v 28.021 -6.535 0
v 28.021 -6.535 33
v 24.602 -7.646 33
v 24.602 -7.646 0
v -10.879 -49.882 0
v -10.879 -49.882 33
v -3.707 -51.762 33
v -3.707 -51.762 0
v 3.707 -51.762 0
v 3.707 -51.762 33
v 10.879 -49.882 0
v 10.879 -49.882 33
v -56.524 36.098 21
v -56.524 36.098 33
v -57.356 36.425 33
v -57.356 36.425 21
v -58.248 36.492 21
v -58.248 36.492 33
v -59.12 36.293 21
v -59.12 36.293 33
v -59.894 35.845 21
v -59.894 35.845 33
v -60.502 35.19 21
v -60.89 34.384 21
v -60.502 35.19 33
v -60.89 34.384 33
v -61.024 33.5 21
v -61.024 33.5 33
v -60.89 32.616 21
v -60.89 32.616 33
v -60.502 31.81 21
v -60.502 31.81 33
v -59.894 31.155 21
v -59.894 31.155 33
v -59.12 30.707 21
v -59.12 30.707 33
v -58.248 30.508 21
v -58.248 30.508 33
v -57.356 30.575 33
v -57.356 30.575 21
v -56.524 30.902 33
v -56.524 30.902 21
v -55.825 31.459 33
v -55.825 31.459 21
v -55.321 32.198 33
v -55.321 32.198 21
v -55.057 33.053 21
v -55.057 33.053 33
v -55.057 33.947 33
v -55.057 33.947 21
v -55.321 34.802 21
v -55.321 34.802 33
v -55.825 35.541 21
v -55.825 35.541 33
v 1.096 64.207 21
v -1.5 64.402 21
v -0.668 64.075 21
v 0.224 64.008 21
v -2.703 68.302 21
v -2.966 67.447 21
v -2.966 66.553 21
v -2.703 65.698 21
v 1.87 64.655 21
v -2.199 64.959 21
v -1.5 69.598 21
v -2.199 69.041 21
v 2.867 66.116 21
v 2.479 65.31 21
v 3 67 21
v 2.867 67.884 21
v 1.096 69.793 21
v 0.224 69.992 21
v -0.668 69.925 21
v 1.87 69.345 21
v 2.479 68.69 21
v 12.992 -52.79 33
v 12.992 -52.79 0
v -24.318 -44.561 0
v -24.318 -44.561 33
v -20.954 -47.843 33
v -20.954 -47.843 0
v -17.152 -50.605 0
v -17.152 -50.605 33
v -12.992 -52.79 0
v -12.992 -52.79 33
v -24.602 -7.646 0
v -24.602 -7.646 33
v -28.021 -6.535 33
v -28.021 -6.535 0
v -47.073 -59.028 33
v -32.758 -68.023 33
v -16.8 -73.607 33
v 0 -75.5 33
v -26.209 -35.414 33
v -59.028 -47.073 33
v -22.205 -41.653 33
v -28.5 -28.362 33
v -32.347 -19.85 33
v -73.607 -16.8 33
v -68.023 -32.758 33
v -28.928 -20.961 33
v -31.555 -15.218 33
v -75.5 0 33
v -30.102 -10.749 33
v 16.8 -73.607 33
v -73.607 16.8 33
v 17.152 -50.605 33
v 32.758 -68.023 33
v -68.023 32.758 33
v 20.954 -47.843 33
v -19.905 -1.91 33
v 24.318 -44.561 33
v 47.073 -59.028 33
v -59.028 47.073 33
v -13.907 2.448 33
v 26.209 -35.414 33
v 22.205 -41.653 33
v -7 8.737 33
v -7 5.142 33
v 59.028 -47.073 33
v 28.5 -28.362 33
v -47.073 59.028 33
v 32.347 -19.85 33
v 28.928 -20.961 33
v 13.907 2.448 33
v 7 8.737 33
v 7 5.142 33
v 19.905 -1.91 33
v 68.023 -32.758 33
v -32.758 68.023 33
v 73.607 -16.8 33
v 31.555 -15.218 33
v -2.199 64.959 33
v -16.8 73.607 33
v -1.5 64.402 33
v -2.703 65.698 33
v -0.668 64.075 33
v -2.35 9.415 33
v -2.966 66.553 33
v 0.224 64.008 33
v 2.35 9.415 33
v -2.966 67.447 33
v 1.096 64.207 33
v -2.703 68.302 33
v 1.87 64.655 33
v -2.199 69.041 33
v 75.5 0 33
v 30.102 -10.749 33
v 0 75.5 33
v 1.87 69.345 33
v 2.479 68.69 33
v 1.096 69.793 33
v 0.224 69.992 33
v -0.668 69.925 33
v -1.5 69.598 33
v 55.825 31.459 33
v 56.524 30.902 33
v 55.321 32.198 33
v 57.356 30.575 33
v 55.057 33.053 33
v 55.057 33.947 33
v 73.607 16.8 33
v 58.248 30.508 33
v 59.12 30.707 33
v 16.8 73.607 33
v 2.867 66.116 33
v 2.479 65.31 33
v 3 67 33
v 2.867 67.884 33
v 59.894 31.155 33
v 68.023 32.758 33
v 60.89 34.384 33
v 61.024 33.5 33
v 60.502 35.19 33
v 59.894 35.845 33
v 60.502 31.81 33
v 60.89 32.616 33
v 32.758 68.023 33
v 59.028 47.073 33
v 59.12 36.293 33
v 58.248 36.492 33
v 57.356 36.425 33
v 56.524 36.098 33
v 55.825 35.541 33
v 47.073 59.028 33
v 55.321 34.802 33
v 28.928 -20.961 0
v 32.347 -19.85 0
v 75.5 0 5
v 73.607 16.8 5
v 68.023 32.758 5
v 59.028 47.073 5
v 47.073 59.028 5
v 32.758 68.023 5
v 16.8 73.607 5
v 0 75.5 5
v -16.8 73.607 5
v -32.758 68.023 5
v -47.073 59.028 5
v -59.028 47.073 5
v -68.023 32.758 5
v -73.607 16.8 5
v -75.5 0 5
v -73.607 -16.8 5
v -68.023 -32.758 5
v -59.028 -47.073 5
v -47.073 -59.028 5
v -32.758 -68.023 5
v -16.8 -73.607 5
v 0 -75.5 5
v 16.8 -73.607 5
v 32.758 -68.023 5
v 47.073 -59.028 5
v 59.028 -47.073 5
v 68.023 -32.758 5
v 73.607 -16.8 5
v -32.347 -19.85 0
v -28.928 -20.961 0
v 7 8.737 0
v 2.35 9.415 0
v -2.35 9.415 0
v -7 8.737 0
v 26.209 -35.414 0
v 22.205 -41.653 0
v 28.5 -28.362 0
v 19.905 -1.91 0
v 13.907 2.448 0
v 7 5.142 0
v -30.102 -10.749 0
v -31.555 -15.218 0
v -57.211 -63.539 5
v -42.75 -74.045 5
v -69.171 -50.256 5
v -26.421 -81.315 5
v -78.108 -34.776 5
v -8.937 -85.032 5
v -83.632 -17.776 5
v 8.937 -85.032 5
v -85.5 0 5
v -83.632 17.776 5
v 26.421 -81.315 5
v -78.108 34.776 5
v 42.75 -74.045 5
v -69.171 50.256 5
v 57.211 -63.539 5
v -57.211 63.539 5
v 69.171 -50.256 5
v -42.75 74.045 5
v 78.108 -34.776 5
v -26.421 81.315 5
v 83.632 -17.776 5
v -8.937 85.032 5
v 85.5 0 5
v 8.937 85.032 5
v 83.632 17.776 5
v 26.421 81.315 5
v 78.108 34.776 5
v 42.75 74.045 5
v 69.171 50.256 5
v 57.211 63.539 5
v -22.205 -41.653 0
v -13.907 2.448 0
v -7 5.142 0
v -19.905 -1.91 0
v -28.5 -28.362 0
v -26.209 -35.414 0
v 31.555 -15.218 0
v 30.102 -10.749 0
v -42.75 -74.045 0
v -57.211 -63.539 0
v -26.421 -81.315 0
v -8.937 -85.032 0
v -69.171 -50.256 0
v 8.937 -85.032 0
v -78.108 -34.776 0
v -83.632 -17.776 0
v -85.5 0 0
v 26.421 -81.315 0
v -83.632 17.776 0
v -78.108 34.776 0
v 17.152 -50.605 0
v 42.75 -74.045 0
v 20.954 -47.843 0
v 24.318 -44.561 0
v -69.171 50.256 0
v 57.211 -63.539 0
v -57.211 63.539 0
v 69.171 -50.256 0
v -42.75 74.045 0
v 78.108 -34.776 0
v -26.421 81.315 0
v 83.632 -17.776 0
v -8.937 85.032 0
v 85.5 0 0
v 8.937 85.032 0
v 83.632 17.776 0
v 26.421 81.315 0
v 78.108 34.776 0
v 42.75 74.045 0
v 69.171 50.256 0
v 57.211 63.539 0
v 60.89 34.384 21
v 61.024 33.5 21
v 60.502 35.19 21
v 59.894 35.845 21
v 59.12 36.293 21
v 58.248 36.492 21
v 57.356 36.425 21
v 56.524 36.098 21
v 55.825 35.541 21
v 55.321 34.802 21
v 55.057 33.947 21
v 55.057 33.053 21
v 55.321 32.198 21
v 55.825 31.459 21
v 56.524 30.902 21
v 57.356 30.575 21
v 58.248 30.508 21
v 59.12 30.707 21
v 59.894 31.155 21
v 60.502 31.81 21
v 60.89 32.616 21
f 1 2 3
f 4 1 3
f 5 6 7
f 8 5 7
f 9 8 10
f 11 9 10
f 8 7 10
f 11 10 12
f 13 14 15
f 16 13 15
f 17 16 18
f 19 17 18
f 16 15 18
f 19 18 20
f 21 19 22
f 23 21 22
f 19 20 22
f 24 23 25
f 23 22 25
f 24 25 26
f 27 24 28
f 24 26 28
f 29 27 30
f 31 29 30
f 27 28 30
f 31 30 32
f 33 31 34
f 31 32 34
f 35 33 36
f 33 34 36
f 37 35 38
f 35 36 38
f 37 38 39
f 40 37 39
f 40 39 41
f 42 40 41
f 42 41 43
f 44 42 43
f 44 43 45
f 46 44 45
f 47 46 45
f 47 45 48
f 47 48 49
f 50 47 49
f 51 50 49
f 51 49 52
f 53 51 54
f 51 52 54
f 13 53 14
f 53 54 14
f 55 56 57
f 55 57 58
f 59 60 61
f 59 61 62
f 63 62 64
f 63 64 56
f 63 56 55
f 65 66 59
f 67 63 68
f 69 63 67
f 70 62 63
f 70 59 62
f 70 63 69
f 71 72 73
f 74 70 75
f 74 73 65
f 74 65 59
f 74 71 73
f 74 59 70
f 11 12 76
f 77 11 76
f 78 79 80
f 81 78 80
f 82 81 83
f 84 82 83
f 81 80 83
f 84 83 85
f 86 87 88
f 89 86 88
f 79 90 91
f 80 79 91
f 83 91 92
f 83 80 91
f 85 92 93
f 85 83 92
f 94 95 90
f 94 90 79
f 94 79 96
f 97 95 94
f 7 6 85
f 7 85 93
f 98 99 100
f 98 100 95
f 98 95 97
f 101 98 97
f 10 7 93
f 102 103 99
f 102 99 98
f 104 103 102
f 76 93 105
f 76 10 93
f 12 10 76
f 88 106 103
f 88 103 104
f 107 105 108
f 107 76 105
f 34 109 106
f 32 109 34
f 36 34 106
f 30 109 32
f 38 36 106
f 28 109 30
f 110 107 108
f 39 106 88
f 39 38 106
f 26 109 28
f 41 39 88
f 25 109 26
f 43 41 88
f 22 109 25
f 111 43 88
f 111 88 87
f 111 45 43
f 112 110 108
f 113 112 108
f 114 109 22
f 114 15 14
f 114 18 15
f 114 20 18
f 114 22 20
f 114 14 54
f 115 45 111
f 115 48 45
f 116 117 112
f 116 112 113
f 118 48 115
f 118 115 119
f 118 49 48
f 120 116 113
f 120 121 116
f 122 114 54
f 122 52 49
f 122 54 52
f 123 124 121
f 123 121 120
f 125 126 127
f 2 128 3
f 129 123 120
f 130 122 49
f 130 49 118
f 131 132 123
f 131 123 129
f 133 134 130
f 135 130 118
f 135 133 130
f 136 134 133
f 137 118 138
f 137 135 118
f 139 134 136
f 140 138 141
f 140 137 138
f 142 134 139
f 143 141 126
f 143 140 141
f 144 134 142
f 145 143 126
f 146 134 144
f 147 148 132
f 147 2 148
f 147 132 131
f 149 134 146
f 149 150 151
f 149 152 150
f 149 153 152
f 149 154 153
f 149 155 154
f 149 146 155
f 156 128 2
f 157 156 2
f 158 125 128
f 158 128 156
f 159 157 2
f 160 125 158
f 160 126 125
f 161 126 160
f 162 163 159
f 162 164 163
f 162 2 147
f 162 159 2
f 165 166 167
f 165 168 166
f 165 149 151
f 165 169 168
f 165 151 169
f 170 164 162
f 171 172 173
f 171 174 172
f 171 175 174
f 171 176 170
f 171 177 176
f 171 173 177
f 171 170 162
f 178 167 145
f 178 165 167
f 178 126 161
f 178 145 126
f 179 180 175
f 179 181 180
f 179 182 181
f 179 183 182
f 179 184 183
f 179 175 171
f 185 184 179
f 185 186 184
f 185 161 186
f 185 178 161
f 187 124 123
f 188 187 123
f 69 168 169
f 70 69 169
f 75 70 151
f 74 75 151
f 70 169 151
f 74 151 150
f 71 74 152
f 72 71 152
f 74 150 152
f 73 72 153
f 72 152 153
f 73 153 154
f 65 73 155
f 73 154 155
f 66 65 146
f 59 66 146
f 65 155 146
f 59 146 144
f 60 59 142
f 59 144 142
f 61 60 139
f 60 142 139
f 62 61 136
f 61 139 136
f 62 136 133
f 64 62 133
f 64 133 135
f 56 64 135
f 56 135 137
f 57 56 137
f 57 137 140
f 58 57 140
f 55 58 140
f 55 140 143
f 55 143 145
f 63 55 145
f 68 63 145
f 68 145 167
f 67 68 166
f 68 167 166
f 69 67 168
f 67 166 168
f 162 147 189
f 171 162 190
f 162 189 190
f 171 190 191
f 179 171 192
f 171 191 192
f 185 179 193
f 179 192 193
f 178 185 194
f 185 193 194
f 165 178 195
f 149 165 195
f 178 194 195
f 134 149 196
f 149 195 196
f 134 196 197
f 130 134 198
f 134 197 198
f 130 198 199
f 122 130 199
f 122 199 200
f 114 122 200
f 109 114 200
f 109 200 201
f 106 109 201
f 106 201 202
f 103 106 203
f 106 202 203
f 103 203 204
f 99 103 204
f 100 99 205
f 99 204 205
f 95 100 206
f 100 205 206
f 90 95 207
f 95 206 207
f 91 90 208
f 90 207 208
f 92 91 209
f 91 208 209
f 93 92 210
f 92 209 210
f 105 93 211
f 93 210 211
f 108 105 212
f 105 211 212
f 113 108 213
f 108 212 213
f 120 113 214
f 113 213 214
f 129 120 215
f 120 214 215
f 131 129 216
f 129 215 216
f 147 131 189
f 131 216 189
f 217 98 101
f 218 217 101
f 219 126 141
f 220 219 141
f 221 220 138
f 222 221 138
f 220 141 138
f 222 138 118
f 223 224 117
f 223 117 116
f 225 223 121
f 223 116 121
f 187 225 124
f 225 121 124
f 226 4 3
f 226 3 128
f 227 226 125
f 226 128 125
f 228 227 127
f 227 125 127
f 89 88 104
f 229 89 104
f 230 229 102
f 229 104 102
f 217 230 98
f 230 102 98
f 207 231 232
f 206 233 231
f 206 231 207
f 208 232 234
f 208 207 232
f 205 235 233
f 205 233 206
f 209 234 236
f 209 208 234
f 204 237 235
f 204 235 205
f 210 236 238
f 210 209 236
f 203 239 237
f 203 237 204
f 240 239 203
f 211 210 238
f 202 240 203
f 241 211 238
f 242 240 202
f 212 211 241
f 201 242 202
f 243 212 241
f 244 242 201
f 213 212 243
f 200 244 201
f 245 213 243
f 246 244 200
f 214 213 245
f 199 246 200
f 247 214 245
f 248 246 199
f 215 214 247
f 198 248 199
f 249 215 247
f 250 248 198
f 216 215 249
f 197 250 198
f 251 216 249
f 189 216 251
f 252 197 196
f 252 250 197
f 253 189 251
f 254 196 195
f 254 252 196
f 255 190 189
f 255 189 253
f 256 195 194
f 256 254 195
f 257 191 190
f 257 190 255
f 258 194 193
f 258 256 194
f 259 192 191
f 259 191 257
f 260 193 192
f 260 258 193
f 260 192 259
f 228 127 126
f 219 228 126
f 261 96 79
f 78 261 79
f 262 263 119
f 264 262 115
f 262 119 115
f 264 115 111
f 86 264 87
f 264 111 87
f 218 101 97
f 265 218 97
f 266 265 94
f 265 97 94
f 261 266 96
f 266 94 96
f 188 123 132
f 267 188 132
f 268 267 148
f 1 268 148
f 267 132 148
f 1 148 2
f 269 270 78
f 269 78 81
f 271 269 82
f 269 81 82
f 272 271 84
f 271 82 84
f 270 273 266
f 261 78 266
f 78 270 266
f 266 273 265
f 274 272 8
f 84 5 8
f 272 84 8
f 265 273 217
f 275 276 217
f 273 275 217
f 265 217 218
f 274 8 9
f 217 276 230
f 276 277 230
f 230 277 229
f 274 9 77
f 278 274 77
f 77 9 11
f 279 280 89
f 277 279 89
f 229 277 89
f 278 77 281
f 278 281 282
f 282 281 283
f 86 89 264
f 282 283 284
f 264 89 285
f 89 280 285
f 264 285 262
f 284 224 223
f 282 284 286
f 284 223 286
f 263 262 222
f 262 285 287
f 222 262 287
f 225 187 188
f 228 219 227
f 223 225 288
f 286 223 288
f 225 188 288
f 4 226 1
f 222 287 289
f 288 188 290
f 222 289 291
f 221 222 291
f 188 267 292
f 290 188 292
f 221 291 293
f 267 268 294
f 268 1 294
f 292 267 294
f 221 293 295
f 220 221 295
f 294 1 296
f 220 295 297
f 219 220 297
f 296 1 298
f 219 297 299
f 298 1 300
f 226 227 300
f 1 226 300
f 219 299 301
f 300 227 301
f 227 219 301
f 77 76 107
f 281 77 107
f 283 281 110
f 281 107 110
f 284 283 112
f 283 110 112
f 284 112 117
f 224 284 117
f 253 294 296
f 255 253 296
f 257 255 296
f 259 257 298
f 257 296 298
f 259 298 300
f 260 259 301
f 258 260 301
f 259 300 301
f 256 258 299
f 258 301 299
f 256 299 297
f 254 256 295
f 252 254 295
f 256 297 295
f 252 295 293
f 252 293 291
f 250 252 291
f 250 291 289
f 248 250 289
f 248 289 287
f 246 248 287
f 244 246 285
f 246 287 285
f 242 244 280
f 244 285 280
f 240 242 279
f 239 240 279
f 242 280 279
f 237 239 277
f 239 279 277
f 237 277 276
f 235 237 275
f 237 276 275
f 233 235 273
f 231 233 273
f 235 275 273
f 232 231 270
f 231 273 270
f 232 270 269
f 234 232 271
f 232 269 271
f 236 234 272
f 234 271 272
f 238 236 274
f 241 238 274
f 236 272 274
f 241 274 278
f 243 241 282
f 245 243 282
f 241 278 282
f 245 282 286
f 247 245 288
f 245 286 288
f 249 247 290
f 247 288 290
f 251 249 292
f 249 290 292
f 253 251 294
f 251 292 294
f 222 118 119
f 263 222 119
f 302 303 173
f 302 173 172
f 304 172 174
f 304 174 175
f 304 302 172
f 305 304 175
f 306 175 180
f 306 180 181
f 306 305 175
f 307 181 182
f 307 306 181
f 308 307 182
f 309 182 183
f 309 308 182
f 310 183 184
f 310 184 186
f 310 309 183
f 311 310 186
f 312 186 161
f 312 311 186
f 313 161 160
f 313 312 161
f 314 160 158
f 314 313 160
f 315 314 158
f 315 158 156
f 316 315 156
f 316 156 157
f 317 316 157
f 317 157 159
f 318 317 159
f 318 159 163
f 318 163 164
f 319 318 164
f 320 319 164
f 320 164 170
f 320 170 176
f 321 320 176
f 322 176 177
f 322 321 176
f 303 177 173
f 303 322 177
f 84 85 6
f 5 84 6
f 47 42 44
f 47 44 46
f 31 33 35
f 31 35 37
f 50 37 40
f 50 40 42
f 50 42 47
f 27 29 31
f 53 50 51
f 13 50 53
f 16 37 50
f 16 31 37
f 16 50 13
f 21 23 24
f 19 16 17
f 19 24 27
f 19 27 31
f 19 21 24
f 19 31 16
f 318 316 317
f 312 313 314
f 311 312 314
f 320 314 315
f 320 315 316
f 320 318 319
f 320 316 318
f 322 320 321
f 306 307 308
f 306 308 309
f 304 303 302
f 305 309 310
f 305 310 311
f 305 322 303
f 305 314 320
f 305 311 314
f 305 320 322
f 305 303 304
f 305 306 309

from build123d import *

# Parameters (mm, degrees)
SKETCH2_R                   = 85.5
BOSS_EXTRUDE1_DEPTH         = 5
SKETCH4_R                   = 75.5
BOSS_EXTRUDE2_DEPTH         = 28
SKETCH5_R                   = 29
CUT_EXTRUDE1_DEPTH          = 126.337544256
CUT_EXTRUDE2_DEPTH          = 126.337544256
CIRPATTERN1_COUNT           = 5
SKETCH10_R                  = 3
CUT_EXTRUDE3_DEPTH          = 12
CIRPATTERN2_COUNT           = 2
CIRPATTERN2_ANGLE           = 60
CIRPATTERN3_COPY_1_SKETCH_R = 3
CIRPATTERN3_COPY_1_DEPTH    = 12
CIRPATTERN3_COPY_2_SKETCH_R = 3
CIRPATTERN3_COPY_2_DEPTH    = 12


with BuildPart() as part:
    # Sketch2 → Boss-Extrude1 (new body)
    with BuildSketch(Plane.XY):
        Circle(SKETCH2_R)
    extrude(amount=BOSS_EXTRUDE1_DEPTH)

    # Sketch4 → Boss-Extrude2 (add)
    with BuildSketch(Plane.XY.offset(5)):
        Circle(SKETCH4_R)
    extrude(amount=BOSS_EXTRUDE2_DEPTH)

    # Sketch5 → Cut-Extrude1 (cut, through all)
    with BuildSketch(Plane.XY.offset(33)):
        with Locations((0, -23)):
            Circle(SKETCH5_R)
    extrude(amount=-CUT_EXTRUDE1_DEPTH, mode=Mode.SUBTRACT)

    # Sketch7 → Cut-Extrude2 (cut, symmetric)
    with BuildSketch(Plane.XY.offset(33)):
        with BuildLine():
            Line((-7, 8.737202145), (-7, 5.142494559))
            ThreePointArc((-7, 5.142494559), (0, 6), (7, 5.142494559))
            Line((7, 5.142494559), (7, 8.737202145))
            ThreePointArc((7, 8.737202145), (0, 9.5), (-7, 8.737202145))
        make_face()
    cut_extrude2 = extrude(amount=CUT_EXTRUDE2_DEPTH, both=True, mode=Mode.SUBTRACT)

    # CirPattern1: Cut-Extrude2 ×5 about axis
    cirpattern1_axis = Axis((0, -23, 33), (0, 0, 1))
    for i in range(1, CIRPATTERN1_COUNT):
        add(cut_extrude2.rotate(cirpattern1_axis, i * 360 / CIRPATTERN1_COUNT), mode=Mode.SUBTRACT)

    # Sketch10 → Cut-Extrude3 (cut)
    with BuildSketch(Plane.XY.offset(33)):
        with Locations((0, 67)):
            Circle(SKETCH10_R)
    cut_extrude3 = extrude(amount=-CUT_EXTRUDE3_DEPTH, mode=Mode.SUBTRACT)

    # CirPattern2: Cut-Extrude3 ×2 about axis
    cirpattern2_axis = Axis((0, 0, 5), (0, 0, 1))
    for i in range(1, CIRPATTERN2_COUNT):
        add(cut_extrude3.rotate(cirpattern2_axis, i * CIRPATTERN2_ANGLE / (CIRPATTERN2_COUNT - 1)), mode=Mode.SUBTRACT)

    # CirPattern3 copy 1 sketch → CirPattern3 copy 1 (cut)
    with BuildSketch(Plane.XY.offset(33)):
        with Locations((0, 67)):
            Circle(CIRPATTERN3_COPY_1_SKETCH_R)
    extrude(amount=-CIRPATTERN3_COPY_1_DEPTH, mode=Mode.SUBTRACT)

    # CirPattern3 copy 2 sketch → CirPattern3 copy 2 (cut)
    with BuildSketch(Plane(origin=(0, 0, 33), x_dir=(0.4999999999999978, -0.8660254037844399, 0), z_dir=(0, 0, 1))):
        with Locations((0, 67)):
            Circle(CIRPATTERN3_COPY_2_SKETCH_R)
    extrude(amount=-CIRPATTERN3_COPY_2_DEPTH, mode=Mode.SUBTRACT)


solid = part.part
